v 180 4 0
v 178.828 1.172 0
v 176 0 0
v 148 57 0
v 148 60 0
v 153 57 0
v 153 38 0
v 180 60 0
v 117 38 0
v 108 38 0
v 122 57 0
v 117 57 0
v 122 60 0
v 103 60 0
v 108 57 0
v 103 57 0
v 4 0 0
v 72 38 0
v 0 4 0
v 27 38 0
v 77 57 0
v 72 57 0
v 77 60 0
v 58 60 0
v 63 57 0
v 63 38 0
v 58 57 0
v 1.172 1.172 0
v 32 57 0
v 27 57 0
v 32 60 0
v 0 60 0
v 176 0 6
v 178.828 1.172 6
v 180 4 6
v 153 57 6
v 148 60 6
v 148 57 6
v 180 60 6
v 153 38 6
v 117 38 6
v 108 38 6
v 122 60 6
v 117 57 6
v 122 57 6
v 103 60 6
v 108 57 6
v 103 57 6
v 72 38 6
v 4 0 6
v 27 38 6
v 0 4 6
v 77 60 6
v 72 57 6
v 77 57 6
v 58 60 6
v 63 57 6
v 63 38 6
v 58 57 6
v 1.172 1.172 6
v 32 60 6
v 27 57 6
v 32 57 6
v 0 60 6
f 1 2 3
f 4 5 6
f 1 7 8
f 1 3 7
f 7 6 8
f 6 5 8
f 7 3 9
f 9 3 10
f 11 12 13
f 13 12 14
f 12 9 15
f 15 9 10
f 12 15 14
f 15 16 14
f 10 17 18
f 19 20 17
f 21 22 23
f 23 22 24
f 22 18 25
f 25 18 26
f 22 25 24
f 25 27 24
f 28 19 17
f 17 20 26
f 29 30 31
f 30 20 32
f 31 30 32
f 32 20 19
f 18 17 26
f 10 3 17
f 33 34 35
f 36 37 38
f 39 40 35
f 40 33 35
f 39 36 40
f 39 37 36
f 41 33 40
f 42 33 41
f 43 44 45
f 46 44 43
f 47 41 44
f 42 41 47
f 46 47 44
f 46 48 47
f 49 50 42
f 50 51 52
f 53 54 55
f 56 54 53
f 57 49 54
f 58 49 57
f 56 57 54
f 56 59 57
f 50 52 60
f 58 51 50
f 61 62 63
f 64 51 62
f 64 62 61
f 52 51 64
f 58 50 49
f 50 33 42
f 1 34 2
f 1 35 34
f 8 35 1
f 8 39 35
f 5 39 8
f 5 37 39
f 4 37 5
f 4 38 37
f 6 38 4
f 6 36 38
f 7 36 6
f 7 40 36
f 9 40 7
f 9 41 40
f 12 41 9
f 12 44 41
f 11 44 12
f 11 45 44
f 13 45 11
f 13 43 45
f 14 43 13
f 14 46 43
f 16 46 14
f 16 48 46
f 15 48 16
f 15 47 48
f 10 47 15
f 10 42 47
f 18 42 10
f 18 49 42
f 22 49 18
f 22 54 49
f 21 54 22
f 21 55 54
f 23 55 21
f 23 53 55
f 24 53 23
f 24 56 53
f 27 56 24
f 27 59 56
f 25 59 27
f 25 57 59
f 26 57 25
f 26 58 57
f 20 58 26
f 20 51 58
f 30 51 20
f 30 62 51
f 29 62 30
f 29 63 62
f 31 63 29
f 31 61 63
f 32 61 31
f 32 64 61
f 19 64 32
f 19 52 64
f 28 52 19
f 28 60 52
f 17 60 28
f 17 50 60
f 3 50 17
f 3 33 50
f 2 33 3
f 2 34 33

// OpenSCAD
$fn = 32;

// ----------------------------------------------------------------------
// Oversize slot bar: 180 mm bar with 3 oversize windows
// ----------------------------------------------------------------------

// --- parameters (mm) ---
profile_height = 6;       // extrusion height
profile_points = 32;      // points of the closed outline

profile = [[0, 4], [1.172, 1.172], [4, 0], [176, 0], [178.828, 1.172], [180, 4], [180, 60], [148, 60], [148, 57], [153, 57], [153, 38], [117, 38], [117, 57], [122, 57], [122, 60], [103, 60], [103, 57], [108, 57], [108, 38], [72, 38], [72, 57], [77, 57], [77, 60], [58, 60], [58, 57], [63, 57], [63, 38], [27, 38], [27, 57], [32, 57], [32, 60], [0, 60]];  // single closed polygon, 32 points, counter clockwise

// --- the one profile operation ---
linear_extrude(height = profile_height) polygon(points = profile);
